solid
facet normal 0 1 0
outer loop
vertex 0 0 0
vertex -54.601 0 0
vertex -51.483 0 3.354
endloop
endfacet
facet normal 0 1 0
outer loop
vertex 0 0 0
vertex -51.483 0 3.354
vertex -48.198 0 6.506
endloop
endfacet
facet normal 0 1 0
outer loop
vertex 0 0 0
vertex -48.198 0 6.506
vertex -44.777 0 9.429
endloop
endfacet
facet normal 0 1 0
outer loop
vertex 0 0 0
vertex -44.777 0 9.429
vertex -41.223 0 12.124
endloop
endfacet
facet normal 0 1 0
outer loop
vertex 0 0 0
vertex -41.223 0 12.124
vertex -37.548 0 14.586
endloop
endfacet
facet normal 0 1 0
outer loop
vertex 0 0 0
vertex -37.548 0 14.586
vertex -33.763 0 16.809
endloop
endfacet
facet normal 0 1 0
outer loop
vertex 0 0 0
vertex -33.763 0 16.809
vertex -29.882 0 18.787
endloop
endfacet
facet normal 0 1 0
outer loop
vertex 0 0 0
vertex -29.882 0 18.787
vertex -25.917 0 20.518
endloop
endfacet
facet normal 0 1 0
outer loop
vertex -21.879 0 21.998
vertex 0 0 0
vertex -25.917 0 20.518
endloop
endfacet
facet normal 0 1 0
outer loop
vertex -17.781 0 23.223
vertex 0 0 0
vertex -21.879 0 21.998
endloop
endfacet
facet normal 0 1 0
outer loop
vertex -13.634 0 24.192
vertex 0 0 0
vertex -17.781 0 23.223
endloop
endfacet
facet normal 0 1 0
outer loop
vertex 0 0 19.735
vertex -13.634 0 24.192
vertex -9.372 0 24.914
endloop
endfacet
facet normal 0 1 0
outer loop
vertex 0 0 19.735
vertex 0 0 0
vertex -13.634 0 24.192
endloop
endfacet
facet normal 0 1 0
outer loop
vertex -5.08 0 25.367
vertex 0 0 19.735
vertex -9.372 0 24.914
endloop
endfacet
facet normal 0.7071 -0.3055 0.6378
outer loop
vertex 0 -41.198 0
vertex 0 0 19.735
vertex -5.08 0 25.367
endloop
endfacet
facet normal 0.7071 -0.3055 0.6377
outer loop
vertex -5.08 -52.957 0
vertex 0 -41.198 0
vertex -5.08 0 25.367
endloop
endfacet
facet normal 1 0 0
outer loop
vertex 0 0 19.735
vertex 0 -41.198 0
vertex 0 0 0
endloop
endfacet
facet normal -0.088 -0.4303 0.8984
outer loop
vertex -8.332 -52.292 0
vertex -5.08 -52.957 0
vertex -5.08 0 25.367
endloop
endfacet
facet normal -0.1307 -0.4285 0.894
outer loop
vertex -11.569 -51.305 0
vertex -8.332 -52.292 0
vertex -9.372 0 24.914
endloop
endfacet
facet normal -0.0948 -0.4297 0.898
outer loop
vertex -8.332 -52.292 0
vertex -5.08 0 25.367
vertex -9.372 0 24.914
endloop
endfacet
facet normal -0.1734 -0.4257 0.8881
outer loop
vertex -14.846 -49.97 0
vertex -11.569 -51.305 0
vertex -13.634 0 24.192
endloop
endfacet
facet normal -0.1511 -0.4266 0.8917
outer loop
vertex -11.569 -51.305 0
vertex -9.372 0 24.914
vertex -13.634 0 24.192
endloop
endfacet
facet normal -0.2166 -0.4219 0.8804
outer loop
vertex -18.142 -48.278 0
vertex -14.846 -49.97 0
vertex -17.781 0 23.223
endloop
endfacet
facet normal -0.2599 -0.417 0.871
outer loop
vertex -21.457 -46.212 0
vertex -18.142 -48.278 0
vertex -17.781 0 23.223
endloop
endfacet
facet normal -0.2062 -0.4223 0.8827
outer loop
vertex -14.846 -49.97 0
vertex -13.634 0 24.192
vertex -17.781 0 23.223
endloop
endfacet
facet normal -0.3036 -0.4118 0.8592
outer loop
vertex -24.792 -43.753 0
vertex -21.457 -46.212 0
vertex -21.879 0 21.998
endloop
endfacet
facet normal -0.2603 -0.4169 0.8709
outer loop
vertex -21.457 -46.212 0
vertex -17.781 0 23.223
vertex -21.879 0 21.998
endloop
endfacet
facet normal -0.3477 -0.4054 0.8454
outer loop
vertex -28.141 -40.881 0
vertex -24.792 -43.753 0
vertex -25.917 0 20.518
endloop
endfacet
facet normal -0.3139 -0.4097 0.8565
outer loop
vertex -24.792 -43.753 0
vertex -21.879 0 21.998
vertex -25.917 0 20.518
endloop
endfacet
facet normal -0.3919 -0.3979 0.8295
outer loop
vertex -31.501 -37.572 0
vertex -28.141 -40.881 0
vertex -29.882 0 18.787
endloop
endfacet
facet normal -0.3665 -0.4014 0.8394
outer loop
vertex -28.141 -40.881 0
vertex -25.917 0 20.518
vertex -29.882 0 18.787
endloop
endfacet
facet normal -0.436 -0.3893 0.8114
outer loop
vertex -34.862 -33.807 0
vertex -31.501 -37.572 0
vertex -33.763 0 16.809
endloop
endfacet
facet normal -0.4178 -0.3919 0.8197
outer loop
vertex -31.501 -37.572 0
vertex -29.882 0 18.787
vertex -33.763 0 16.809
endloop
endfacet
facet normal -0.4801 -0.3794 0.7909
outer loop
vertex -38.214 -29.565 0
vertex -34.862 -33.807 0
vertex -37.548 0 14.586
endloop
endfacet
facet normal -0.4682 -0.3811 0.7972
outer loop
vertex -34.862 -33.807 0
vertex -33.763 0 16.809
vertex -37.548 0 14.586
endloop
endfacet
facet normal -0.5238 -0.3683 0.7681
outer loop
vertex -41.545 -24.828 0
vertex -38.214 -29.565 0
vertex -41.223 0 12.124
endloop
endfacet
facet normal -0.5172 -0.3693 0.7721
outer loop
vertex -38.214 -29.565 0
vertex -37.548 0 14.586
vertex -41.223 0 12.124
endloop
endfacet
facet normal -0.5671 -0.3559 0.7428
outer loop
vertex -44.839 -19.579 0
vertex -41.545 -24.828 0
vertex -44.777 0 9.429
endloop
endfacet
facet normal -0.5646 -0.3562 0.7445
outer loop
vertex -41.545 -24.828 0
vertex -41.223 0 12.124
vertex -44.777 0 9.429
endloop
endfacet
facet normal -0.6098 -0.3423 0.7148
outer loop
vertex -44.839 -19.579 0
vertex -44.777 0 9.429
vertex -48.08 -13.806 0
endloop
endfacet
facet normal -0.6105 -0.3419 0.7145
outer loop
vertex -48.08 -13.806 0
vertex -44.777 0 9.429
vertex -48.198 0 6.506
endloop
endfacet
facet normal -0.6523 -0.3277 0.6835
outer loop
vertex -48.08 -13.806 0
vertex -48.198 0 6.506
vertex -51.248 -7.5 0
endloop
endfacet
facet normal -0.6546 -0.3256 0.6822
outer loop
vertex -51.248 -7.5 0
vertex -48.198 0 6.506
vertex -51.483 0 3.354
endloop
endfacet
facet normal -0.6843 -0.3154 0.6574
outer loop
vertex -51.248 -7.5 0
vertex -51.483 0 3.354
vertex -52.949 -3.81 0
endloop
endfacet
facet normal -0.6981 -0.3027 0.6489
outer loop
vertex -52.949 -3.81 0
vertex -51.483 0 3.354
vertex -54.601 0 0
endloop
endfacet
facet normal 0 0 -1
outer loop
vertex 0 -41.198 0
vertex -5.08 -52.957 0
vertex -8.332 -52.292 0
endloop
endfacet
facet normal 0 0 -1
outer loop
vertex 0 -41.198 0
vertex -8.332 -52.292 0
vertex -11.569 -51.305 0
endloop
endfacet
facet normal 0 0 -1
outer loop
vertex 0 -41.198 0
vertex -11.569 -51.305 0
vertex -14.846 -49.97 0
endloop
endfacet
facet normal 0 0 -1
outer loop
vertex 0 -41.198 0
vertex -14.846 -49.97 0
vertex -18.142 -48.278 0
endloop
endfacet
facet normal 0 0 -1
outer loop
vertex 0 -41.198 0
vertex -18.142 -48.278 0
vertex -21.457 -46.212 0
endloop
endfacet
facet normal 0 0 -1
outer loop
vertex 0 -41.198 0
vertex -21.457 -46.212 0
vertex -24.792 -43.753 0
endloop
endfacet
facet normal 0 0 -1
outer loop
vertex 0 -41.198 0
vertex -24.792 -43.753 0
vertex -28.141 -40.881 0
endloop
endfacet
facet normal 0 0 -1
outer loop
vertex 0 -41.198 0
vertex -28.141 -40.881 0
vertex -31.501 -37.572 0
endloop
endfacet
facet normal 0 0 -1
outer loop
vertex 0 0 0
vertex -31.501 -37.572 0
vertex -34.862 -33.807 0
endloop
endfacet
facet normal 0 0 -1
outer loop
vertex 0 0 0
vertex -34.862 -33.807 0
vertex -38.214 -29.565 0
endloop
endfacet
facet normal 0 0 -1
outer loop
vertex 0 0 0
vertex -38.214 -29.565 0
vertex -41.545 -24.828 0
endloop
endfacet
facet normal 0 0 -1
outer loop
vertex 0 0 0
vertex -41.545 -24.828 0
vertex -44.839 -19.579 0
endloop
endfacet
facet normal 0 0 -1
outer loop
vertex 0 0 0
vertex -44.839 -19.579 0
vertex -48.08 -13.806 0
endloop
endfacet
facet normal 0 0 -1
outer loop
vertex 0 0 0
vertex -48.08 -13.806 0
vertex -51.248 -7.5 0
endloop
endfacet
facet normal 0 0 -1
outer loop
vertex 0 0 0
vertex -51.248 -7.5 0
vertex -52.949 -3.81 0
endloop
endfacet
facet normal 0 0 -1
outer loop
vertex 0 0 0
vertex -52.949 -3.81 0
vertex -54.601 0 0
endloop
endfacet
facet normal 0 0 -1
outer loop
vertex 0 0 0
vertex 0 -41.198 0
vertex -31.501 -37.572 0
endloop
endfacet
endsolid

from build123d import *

# Parameters (mm, degrees)
F3_DEPTH    = 76.2
F4_SIZE     = 5.08
F5_T1_DEPTH = 438.8719745558


# Not quite as in the source:
# - a fillet or chamfer that OpenCascade refuses, or shapes differently, is made with other operations: its cross-section is extruded or revolved along the edge and cut away or added
# - a feature of the source that left no trace in its solid (it failed there, or was rolled back) is left out


with BuildPart() as f3:
    # F2 (on Right) → F3 (new body)
    with BuildSketch(Plane.YZ):
        Polygon((-52.9574006796, 0), (0, 0), (0, 25.36736615), align=None)
    extrude(amount=-F3_DEPTH)

    # F4
    f4_edges = [f3.edges().sort_by_distance(p)[0] for p in [
        (0, -26.4787, 12.683683),
    ]]
    chamfer(f4_edges, length=F4_SIZE)

    # F5: fillet of radius 76.2 on 1 edges, made by hand

    # F5_s2 → F5_t1 (cut)
    with BuildSketch(Plane(origin=(0, 181.3074352717, 86.8489018954), x_dir=(1, 0, 0), z_dir=(0, -0.9018694789, -0.4320086144))):
        with BuildLine():
            ThreePointArc((-5.08, 22.8780532919), (-55.6486118425, -1.0979149163), (-76.2, -53.1524248074))
            Line((-76.2, -53.1524248074), (-76.2, 22.8780532919))
            Line((-76.2, 22.8780532919), (-5.08, 22.8780532919))
        make_face()
    extrude(amount=F5_T1_DEPTH, mode=Mode.SUBTRACT)


solid = f3.part
